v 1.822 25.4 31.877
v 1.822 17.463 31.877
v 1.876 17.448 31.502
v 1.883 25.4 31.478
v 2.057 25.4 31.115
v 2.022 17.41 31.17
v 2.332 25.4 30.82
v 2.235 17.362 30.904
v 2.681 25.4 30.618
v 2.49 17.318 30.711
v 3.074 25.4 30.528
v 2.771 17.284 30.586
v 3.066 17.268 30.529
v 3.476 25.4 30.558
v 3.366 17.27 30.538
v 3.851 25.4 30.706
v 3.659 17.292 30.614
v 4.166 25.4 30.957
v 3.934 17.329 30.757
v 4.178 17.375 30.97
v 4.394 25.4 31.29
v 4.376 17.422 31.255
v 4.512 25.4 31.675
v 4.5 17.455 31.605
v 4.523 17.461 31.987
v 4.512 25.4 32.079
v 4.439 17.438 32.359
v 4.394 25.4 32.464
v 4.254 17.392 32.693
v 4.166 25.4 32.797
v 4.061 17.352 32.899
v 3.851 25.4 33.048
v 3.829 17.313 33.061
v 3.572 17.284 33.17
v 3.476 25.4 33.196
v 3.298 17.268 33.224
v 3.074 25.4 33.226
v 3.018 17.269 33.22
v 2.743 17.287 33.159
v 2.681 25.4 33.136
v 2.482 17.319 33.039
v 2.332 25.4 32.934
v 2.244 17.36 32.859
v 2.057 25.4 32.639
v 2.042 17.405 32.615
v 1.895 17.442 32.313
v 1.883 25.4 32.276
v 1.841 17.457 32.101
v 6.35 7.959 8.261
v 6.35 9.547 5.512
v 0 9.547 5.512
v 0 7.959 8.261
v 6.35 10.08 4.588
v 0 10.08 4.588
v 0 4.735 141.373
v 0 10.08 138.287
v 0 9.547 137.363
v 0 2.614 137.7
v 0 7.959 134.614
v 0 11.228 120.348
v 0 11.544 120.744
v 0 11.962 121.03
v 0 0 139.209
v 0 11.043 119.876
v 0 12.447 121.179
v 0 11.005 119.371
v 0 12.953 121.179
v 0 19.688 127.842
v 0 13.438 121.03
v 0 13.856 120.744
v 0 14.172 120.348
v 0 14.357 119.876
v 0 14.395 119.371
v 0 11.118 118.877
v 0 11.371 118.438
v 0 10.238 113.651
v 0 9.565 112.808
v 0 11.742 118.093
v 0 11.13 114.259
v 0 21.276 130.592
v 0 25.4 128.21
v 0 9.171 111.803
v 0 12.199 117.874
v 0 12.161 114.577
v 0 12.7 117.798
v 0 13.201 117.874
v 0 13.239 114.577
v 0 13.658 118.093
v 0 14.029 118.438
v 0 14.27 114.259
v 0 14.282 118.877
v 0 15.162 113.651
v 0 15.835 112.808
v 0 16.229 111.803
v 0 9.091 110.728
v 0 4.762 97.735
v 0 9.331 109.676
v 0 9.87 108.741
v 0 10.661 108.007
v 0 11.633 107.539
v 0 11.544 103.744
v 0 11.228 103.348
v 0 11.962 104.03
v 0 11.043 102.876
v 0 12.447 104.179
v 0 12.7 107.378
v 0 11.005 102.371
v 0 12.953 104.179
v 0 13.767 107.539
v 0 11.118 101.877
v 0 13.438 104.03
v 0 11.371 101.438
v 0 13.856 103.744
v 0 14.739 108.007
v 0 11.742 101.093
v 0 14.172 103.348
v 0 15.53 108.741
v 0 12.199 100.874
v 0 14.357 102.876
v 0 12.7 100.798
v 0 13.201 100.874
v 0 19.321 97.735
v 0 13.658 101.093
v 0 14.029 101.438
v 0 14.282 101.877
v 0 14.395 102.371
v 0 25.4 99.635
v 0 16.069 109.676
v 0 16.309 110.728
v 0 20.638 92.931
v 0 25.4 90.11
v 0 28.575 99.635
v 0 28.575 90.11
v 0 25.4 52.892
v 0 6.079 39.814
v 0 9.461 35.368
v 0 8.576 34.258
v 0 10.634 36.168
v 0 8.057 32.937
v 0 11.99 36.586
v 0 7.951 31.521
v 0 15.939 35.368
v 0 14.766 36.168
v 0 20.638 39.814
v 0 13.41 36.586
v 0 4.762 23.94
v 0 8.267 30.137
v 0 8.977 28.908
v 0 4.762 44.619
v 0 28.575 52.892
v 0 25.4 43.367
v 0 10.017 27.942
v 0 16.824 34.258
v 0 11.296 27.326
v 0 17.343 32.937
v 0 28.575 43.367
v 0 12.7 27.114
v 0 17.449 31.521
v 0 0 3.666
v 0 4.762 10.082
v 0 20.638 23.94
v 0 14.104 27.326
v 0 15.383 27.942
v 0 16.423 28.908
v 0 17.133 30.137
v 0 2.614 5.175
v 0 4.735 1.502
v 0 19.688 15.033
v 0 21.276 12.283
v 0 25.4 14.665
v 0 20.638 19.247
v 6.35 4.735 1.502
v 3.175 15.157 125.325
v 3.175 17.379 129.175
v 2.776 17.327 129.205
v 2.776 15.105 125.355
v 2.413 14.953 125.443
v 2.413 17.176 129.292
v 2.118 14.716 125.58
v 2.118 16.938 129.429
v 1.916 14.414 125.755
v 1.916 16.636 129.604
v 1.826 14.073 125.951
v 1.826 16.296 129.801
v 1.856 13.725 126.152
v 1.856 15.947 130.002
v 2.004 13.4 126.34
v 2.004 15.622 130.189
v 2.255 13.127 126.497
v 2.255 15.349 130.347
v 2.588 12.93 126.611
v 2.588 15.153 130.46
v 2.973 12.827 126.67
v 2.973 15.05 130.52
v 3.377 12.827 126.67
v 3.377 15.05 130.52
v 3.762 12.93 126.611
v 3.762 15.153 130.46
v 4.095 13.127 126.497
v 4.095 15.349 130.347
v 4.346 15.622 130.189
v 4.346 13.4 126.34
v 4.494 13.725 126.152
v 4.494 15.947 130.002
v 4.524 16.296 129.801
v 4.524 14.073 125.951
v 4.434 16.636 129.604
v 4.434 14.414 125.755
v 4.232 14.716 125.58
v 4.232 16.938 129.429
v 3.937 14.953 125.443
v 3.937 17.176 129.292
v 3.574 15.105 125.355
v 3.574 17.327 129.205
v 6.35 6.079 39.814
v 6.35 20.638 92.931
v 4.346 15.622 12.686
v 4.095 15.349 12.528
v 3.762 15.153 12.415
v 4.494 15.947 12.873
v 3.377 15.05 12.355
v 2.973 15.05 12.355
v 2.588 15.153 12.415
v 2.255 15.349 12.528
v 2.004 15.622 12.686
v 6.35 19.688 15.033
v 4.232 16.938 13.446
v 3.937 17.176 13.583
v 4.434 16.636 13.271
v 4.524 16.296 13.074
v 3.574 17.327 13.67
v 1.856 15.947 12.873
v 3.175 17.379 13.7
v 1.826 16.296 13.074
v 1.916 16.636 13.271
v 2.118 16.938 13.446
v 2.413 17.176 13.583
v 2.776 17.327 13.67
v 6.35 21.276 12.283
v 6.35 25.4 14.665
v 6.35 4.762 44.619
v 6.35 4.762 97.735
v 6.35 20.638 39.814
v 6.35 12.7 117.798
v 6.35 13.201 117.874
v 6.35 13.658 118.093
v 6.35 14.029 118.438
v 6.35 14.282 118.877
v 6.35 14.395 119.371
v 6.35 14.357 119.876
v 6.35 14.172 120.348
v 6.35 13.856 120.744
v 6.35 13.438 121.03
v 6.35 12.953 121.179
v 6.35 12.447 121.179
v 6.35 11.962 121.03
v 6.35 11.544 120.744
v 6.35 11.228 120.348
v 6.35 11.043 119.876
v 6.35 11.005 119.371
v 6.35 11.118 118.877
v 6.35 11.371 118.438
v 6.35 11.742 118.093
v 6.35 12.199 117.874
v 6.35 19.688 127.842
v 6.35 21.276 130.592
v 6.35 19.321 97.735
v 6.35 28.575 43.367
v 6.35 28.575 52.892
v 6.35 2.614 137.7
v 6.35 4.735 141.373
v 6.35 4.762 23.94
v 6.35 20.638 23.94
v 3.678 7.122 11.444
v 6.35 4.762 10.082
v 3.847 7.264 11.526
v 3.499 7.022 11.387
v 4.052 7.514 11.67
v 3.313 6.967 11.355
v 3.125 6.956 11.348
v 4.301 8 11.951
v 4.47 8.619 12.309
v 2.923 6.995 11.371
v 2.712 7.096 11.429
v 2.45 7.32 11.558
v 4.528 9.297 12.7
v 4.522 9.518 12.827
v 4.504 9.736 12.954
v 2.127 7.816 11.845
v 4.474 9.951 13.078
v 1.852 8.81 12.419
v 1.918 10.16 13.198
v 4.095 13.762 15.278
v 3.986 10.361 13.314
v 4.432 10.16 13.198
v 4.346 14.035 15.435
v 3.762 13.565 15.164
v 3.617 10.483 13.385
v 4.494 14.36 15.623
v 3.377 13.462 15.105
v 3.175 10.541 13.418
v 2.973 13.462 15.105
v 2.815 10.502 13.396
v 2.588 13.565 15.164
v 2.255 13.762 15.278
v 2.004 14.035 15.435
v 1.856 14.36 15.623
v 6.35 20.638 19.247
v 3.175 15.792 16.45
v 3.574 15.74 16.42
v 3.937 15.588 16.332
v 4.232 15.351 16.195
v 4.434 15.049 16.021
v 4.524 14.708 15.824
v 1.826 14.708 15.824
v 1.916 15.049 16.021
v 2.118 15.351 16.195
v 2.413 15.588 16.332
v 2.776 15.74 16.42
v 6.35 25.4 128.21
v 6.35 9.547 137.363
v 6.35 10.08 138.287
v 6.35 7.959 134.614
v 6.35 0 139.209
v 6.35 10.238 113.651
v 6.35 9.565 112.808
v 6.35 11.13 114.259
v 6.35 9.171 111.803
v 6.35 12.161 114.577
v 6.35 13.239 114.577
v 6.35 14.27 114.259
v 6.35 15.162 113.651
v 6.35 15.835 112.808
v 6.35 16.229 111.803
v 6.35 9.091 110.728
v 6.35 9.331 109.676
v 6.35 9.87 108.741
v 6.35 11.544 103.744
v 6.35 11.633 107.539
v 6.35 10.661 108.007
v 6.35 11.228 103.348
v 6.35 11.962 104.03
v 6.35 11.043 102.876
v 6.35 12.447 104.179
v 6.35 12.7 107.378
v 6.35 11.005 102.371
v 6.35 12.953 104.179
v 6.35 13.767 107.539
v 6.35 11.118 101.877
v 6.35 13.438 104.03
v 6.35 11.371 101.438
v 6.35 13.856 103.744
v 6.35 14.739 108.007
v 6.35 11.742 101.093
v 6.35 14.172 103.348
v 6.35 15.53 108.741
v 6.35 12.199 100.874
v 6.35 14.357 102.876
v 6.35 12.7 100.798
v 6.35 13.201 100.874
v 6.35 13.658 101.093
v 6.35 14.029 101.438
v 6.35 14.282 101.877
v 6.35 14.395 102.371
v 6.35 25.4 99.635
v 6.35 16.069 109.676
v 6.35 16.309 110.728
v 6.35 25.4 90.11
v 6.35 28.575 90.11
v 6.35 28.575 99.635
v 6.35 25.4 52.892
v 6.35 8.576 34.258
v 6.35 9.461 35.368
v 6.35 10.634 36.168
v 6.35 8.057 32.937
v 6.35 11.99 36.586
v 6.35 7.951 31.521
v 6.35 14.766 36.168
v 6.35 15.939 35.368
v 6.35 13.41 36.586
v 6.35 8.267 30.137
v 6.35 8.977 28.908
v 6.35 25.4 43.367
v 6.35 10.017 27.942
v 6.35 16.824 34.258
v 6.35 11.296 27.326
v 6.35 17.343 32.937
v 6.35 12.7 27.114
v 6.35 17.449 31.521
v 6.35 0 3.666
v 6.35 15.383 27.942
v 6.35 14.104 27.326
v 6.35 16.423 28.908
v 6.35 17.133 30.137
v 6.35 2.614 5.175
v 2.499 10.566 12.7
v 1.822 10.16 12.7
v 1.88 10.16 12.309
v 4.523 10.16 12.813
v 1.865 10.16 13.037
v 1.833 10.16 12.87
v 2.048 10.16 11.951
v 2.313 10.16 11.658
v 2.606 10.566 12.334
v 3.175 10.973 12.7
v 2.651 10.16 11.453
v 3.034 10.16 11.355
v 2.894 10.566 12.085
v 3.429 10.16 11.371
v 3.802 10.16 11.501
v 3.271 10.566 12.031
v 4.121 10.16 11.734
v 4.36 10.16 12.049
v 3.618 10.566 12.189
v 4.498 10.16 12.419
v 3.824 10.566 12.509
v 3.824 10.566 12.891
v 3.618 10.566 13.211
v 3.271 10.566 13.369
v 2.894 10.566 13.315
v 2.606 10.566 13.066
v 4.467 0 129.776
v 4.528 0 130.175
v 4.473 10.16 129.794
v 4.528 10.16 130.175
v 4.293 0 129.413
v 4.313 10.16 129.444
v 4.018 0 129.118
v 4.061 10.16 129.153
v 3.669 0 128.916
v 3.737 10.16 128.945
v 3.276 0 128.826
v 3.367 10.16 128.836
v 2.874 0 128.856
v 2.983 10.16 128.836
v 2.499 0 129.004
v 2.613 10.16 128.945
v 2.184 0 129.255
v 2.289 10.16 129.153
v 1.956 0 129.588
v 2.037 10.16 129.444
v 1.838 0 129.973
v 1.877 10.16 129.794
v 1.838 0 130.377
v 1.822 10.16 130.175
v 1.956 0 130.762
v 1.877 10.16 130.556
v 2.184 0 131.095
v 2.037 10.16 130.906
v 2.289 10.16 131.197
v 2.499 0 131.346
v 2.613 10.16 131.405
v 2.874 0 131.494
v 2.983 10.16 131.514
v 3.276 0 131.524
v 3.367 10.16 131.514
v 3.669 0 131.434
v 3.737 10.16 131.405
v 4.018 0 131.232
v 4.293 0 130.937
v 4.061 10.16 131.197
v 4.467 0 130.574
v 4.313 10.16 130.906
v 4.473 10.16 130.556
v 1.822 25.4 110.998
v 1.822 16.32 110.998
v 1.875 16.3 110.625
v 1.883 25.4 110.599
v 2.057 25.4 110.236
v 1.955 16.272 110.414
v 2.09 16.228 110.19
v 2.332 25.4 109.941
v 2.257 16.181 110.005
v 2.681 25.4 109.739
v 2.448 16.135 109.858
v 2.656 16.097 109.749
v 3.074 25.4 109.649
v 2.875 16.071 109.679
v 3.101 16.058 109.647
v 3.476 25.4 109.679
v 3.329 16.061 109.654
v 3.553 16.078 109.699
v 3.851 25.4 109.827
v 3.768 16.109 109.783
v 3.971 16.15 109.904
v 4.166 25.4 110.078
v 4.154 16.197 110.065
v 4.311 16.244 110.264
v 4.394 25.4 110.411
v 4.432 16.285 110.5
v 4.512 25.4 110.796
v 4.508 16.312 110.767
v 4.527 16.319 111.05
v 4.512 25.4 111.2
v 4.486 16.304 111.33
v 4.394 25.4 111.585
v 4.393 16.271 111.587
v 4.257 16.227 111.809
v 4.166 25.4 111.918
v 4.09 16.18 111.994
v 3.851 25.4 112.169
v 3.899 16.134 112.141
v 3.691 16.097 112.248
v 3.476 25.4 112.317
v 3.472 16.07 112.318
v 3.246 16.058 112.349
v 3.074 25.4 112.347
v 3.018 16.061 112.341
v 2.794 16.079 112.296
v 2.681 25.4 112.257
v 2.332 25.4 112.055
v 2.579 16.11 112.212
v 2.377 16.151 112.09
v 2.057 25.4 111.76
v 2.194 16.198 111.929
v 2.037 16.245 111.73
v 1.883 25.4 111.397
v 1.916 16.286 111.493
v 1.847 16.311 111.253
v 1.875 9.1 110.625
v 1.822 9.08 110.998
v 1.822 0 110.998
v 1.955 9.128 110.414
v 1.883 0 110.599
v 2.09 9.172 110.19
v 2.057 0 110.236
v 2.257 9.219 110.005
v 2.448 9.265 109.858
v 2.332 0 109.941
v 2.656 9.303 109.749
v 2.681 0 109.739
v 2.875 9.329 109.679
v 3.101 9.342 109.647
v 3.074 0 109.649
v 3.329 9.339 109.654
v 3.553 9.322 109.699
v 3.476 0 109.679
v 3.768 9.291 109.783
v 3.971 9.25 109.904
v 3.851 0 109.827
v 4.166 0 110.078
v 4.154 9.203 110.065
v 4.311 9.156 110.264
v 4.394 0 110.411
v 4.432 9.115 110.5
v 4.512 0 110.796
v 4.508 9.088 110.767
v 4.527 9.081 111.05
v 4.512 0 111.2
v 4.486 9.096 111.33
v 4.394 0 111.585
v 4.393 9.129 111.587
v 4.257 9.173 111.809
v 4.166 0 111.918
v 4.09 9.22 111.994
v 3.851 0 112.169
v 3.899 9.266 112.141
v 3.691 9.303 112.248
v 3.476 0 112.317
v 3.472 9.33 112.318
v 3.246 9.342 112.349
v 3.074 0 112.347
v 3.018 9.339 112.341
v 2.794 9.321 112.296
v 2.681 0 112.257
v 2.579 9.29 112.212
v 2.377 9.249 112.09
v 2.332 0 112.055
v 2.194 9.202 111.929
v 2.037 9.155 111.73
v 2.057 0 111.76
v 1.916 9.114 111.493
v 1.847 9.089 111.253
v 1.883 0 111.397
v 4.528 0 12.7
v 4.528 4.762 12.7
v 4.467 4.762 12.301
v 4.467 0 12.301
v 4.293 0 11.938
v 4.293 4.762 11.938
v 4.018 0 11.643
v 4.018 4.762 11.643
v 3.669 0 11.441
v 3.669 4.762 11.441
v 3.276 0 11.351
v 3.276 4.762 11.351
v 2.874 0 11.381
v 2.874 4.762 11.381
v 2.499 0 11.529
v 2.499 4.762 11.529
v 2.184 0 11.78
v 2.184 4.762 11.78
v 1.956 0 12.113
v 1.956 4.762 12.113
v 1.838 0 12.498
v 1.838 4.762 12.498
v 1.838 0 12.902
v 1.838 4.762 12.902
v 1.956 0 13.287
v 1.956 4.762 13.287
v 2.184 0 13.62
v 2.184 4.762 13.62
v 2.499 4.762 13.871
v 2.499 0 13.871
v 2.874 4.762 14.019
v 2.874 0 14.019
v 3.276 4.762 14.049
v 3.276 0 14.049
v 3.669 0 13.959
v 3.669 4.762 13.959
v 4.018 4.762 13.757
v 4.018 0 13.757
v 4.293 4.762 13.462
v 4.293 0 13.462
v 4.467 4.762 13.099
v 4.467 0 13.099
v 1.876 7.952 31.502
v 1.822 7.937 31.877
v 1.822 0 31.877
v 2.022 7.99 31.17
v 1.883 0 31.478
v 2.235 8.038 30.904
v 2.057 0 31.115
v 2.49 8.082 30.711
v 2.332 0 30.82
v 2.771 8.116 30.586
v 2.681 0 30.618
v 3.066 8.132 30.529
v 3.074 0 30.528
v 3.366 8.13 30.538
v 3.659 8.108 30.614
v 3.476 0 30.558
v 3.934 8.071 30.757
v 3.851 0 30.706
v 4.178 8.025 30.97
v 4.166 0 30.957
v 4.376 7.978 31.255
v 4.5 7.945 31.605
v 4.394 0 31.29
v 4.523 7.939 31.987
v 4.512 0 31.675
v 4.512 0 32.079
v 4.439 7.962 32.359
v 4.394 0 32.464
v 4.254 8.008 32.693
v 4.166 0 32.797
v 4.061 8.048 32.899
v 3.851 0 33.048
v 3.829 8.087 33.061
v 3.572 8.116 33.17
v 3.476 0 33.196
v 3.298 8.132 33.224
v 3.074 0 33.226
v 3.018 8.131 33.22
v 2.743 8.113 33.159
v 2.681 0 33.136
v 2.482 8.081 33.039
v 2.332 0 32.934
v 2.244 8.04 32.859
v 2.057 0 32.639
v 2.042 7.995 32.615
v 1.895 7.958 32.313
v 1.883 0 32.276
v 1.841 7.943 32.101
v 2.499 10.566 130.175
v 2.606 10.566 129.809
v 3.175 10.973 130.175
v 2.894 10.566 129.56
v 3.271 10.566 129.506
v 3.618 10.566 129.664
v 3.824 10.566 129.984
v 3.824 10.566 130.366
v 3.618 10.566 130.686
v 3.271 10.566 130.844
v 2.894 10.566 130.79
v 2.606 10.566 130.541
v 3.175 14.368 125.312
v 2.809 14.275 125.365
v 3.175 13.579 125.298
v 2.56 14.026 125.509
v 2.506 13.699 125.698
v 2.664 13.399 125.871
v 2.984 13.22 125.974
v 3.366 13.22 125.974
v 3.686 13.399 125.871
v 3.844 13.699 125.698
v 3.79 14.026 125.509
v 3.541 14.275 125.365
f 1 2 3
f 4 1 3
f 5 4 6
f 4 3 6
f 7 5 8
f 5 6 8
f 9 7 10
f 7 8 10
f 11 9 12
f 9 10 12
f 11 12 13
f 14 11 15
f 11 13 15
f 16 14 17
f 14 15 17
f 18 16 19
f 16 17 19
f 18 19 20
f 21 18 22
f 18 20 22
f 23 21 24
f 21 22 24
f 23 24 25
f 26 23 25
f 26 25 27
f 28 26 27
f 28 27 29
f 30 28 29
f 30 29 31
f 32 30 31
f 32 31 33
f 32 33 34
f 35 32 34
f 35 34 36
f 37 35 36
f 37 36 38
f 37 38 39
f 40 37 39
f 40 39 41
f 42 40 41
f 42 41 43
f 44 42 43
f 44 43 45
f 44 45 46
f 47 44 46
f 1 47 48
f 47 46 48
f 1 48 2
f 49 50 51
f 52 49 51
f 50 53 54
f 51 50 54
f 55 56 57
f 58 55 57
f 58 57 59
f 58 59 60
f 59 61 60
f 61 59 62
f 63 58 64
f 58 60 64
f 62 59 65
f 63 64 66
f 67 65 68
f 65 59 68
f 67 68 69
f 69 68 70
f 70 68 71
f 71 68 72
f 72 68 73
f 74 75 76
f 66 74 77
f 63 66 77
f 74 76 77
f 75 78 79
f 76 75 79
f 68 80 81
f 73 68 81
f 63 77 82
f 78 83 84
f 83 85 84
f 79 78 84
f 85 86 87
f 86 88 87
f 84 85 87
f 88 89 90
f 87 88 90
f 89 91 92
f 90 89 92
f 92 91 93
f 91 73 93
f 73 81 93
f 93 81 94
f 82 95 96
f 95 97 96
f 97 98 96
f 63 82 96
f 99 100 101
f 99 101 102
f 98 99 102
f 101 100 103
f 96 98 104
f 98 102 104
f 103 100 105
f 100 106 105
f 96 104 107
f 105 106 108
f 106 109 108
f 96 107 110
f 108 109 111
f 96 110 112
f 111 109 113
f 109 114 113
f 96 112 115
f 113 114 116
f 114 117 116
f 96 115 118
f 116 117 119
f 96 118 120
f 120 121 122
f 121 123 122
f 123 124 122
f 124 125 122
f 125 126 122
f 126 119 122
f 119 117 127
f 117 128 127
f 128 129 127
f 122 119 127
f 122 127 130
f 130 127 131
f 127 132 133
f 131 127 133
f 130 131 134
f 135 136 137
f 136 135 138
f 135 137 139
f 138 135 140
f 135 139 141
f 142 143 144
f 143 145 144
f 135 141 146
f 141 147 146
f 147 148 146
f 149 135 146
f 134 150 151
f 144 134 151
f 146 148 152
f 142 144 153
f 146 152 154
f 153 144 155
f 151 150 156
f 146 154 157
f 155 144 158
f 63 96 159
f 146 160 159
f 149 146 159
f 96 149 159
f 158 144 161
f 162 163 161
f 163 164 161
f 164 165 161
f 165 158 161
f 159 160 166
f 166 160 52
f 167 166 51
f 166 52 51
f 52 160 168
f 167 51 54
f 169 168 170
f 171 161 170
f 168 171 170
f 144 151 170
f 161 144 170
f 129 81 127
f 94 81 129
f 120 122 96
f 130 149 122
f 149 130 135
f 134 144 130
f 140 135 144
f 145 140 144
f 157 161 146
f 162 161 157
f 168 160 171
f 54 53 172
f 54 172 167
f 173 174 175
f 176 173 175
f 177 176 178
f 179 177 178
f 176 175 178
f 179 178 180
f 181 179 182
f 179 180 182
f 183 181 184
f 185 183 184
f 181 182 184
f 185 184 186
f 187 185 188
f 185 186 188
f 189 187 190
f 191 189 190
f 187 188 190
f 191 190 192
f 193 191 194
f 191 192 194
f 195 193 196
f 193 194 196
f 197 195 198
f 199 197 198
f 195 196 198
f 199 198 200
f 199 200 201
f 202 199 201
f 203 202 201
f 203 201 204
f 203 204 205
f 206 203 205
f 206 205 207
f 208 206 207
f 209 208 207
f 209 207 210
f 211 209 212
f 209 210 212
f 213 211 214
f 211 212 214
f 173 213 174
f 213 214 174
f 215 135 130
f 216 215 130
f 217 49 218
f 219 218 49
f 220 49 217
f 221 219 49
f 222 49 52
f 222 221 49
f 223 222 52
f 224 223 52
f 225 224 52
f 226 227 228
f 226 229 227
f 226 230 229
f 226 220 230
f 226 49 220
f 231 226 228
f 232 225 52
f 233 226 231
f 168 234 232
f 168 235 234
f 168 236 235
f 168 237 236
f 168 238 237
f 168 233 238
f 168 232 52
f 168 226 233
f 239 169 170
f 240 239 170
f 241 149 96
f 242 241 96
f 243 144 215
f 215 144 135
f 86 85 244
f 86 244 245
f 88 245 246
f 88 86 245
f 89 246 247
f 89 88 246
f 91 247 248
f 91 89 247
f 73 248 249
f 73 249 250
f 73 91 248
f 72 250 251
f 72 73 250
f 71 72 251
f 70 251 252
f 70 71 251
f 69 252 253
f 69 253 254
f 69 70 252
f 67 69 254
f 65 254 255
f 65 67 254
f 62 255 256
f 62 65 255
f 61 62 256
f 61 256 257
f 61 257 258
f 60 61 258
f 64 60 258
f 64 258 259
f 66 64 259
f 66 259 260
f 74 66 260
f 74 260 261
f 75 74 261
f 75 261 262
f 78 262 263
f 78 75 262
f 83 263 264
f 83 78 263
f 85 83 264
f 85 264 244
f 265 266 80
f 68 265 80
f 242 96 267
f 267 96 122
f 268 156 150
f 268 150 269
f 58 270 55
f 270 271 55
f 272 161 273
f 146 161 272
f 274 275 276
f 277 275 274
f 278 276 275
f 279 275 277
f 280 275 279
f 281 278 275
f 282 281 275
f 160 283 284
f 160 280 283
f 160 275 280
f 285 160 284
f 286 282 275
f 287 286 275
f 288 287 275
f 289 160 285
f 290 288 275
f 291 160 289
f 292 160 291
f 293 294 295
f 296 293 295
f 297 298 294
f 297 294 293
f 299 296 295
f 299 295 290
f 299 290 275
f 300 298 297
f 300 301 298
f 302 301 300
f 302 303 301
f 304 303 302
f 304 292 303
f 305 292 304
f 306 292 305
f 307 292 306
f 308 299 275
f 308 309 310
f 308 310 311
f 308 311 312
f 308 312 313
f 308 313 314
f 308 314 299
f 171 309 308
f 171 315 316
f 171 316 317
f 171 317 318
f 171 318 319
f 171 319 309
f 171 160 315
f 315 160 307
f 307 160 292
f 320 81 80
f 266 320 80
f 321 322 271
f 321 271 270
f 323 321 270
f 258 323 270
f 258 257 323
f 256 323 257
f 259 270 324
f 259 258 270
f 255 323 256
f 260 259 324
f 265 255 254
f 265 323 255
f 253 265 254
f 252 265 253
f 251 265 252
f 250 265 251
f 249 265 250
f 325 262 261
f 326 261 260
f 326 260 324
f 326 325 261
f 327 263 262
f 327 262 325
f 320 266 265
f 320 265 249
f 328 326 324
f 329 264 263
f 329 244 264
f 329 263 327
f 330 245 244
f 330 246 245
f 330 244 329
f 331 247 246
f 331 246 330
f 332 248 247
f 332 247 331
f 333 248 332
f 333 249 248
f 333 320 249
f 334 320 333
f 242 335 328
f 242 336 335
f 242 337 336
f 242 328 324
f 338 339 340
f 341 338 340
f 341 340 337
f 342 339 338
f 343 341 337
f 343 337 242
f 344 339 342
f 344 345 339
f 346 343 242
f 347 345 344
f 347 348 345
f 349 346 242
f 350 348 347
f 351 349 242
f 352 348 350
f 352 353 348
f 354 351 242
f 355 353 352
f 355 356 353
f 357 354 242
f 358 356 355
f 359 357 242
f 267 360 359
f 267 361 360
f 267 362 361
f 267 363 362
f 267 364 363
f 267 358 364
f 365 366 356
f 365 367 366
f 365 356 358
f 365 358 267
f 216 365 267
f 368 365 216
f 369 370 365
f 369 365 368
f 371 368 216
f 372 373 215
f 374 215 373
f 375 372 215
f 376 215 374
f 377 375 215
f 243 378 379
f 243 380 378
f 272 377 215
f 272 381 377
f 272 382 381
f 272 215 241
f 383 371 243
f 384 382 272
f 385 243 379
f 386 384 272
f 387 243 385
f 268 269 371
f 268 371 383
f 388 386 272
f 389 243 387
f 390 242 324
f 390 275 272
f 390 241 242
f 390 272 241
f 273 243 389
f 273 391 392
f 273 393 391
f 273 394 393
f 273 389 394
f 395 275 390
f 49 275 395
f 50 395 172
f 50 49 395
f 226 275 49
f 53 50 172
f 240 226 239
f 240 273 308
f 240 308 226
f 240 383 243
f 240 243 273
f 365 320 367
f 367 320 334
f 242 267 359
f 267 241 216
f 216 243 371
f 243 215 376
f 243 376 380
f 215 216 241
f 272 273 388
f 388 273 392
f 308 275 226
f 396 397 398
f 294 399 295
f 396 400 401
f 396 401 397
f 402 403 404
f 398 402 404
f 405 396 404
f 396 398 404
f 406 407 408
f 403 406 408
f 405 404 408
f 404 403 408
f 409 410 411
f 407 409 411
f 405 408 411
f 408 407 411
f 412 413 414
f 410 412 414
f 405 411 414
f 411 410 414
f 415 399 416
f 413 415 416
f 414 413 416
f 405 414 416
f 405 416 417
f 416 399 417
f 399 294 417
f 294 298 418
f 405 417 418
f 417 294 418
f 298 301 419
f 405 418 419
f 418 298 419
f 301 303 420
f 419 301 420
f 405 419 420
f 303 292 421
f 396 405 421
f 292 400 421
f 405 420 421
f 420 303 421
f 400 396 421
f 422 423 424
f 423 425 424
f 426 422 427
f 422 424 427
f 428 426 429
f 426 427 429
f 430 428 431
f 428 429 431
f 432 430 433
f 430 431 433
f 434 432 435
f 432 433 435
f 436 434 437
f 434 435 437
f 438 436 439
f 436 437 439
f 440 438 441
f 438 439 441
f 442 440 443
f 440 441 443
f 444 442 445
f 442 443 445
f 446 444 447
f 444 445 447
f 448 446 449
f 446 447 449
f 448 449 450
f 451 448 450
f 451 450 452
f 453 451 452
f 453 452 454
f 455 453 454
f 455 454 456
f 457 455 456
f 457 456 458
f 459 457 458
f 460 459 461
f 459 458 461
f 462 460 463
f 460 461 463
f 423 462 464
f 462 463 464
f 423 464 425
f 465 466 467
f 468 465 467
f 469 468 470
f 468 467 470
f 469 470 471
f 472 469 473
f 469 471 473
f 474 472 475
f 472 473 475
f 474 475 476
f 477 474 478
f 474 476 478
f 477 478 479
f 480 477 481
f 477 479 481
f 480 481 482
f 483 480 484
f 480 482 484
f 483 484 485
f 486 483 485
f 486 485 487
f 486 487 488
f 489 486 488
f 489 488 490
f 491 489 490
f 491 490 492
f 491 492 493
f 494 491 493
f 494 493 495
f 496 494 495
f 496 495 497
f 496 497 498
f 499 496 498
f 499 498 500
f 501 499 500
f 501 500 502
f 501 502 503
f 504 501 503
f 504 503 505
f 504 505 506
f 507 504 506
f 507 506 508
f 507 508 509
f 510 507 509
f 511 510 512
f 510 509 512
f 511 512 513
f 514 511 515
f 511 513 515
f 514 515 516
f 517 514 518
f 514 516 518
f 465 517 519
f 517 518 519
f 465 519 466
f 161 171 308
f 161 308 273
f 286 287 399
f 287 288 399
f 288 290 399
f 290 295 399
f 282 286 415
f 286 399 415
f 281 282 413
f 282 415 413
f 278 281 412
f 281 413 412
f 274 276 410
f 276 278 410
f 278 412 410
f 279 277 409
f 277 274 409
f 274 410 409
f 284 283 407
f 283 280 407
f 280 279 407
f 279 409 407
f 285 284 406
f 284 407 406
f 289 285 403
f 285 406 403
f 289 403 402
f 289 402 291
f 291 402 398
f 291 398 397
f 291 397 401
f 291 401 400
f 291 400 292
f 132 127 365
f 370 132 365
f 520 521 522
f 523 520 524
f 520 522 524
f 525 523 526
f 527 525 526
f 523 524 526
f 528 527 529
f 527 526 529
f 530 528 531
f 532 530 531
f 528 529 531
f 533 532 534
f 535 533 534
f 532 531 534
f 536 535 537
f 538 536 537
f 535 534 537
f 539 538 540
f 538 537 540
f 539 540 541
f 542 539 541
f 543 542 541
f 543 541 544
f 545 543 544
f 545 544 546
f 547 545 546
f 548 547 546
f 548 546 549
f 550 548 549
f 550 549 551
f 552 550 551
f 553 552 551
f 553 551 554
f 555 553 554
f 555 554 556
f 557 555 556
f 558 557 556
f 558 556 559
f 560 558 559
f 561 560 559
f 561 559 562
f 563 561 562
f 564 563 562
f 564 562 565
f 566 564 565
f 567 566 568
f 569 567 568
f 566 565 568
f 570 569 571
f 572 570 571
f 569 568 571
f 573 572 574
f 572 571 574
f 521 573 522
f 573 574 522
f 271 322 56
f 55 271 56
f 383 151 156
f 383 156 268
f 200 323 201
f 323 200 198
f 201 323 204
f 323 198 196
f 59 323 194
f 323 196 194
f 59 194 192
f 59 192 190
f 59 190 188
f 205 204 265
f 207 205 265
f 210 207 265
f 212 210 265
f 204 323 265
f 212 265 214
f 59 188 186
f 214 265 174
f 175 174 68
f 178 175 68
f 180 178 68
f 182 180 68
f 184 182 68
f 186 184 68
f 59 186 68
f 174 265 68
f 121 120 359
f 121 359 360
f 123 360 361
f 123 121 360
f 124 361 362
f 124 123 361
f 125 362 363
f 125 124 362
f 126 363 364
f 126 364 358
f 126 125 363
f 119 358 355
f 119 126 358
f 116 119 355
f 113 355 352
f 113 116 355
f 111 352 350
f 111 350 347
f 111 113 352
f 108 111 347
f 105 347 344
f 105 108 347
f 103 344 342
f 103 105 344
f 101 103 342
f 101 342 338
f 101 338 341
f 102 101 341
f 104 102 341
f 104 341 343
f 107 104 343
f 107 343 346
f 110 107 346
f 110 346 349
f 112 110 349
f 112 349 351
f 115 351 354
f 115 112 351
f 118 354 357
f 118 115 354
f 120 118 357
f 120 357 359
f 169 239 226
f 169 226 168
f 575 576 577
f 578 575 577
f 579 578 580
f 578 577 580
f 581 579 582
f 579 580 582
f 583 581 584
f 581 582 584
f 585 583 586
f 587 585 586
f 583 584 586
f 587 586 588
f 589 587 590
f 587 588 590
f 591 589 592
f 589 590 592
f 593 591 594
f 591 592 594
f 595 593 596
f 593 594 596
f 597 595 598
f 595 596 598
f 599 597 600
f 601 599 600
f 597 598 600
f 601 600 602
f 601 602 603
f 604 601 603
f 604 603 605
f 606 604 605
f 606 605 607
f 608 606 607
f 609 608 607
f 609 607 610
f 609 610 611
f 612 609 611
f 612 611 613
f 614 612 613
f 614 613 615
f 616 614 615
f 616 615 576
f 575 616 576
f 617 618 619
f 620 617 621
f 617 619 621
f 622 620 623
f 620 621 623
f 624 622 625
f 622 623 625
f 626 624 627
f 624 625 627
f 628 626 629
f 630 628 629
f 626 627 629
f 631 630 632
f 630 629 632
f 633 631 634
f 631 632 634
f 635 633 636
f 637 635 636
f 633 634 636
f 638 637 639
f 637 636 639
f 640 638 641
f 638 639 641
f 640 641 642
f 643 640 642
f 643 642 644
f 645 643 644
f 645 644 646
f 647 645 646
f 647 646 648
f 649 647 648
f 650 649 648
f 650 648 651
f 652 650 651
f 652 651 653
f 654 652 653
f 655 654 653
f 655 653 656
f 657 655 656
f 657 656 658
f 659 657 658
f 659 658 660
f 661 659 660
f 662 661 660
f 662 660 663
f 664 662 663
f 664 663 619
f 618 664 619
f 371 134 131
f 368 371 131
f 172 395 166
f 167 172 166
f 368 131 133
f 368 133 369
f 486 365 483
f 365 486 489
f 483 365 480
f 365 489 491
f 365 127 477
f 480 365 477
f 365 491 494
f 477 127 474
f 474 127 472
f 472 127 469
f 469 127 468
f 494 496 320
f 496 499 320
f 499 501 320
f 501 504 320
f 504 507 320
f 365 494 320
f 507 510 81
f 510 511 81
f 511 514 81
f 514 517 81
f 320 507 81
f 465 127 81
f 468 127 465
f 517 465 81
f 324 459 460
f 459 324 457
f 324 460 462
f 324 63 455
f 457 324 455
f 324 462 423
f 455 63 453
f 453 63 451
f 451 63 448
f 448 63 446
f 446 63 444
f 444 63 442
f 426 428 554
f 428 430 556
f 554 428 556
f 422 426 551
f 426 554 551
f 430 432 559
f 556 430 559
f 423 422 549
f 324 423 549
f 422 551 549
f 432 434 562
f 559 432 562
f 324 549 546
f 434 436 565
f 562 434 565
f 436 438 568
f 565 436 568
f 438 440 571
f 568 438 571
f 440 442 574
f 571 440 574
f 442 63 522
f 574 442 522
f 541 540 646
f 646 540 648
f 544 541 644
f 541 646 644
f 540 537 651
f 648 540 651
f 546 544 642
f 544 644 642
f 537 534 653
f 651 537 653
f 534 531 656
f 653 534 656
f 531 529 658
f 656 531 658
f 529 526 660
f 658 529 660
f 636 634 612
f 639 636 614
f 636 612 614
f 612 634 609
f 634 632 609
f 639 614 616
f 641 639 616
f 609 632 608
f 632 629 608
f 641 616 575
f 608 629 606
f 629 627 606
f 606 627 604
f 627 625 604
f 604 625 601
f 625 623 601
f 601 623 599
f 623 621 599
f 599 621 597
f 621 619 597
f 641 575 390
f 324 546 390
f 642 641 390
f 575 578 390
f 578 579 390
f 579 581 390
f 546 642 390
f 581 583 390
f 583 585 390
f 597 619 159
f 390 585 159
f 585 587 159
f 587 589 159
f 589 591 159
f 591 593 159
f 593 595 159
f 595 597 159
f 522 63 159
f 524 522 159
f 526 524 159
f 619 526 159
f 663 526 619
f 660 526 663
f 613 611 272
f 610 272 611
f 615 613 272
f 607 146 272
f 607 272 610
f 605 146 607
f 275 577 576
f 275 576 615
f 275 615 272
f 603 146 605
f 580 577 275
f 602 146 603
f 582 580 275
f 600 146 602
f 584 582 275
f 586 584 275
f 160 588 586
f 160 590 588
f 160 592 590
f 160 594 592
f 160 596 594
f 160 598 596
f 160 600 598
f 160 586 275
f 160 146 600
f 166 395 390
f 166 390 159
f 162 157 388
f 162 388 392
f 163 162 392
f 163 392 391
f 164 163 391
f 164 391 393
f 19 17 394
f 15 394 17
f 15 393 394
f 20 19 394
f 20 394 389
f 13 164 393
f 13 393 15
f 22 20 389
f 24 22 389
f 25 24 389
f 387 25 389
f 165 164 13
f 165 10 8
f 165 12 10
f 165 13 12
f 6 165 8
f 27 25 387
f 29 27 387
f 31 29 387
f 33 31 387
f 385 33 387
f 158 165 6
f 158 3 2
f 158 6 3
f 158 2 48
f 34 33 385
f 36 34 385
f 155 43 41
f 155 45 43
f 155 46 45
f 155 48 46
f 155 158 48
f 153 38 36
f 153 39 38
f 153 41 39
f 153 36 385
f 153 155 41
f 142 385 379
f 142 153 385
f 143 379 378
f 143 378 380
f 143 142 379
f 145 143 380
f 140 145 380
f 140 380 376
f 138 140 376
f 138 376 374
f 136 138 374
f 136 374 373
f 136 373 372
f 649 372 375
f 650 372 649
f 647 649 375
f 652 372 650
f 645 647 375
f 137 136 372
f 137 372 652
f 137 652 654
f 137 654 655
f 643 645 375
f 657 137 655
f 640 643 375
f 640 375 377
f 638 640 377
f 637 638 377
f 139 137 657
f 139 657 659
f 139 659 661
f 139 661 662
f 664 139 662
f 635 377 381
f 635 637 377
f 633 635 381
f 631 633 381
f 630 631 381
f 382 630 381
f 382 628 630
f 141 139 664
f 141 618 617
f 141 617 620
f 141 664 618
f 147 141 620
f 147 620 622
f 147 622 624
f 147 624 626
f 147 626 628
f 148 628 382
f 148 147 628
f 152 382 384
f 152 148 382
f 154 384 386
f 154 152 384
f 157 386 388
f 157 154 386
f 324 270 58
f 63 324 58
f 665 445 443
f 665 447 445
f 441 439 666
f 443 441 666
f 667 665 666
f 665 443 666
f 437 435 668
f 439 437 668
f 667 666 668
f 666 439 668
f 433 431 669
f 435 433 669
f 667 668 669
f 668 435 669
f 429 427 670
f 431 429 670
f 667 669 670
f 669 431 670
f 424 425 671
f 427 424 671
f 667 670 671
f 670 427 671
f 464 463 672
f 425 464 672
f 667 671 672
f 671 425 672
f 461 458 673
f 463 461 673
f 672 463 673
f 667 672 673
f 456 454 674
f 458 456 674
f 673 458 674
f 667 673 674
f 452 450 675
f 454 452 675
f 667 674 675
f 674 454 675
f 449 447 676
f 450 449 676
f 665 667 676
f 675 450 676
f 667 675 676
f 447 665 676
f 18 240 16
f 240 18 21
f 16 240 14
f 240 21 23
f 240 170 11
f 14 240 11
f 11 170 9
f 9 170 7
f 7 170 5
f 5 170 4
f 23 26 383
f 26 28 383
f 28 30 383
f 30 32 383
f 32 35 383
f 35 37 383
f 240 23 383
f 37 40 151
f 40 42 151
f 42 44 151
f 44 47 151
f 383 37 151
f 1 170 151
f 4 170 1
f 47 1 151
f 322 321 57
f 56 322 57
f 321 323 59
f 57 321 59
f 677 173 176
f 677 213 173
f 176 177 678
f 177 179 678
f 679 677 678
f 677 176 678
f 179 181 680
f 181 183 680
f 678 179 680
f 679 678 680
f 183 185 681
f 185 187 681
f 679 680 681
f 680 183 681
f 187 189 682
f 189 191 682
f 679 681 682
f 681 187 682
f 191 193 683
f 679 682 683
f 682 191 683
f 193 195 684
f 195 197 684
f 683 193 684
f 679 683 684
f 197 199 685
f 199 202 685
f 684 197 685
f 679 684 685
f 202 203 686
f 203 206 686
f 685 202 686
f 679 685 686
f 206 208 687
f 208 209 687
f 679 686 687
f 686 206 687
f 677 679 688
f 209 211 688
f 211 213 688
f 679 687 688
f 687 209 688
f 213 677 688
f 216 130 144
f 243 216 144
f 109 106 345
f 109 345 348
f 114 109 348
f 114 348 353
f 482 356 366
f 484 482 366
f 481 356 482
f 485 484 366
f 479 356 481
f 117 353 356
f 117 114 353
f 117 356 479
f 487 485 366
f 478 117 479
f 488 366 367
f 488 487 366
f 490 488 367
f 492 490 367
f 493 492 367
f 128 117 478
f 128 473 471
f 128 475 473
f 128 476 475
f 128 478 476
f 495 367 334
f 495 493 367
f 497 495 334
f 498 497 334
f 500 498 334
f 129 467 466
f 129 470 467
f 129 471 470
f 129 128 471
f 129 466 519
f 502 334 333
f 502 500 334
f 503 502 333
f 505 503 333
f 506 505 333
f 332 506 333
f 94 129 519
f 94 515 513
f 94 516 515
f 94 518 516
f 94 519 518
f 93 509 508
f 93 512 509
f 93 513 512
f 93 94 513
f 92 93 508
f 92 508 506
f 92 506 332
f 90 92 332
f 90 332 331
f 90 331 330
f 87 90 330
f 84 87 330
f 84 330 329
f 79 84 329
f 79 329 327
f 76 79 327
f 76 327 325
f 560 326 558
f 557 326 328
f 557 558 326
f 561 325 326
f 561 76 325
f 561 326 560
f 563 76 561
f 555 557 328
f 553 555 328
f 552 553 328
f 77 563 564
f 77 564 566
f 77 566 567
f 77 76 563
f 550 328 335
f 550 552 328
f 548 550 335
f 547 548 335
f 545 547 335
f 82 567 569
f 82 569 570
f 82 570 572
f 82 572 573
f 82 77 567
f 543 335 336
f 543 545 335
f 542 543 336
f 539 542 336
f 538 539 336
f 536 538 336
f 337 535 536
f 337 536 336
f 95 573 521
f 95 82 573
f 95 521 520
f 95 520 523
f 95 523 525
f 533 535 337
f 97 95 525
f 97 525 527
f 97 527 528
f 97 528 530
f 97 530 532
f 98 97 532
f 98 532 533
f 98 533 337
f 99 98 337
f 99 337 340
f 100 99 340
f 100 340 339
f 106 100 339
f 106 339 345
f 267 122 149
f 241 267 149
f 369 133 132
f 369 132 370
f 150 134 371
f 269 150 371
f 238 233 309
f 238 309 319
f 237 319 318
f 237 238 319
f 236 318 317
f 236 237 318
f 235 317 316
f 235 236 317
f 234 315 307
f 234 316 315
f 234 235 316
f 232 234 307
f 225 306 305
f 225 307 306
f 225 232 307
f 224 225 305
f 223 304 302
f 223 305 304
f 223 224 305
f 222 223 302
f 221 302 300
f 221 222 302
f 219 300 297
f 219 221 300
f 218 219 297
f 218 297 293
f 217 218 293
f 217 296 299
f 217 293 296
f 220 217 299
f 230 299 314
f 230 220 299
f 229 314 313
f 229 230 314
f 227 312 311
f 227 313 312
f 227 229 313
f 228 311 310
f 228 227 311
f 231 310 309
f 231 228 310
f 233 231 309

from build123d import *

# Parameters (mm, degrees)
SKETCH1_R                     = 3.6195
SKETCH1_R_2                   = 4.7625
SKETCH1_R_3                   = 1.6999966
BOSS_EXTRUDE1_DEPTH           = 6.35
SKETCH12_W                    = 6.35
SKETCH12_H                    = 6.1722
BOSS_EXTRUDE3_DEPTH           = 1.0668
CUT_EXTRUDE1_DEPTH            = 146.254081268
TAP_DRILL_FOR_6_32_TAP4_D     = 2.7051
TAP_DRILL_FOR_6_32_TAP3_D     = 2.7051
TAP_DRILL_FOR_6_32_TAP3_DEPTH = 10.16
TAP_DRILL_FOR_6_32_TAP3_TIP   = 0.81269403
SKETCH20_W                    = 6.35
SKETCH20_H                    = 13.543293675
SKETCH20_H_2                  = 12.7
CUT_EXTRUDE2_DEPTH            = 3.175
SKETCH21_W                    = 6.35
SKETCH21_H                    = 9.525
BOSS_EXTRUDE4_DEPTH           = 3.175


with BuildPart() as part:
    # Sketch1 → Boss-Extrude1 (new body)
    with BuildSketch(Plane(origin=(0, 0, 0), x_dir=(0, 0, -1), z_dir=(1, 0, 0))):
        Polygon((0, 0), (-14.664696837, 25.4), (-128.210303163, 25.4), (-142.875, 0), align=None)
        with Locations((-110.998, 12.7)):
            Circle(SKETCH1_R, mode=Mode.SUBTRACT)
        with Locations((-31.877, 12.7)):
            Circle(SKETCH1_R_2, mode=Mode.SUBTRACT)
        with Locations((-102.4979916, 12.7)):
            Circle(SKETCH1_R_3, mode=Mode.SUBTRACT)
        with Locations((-119.4980084, 12.7)):
            Circle(SKETCH1_R_3, mode=Mode.SUBTRACT)
    extrude(amount=BOSS_EXTRUDE1_DEPTH)

    # Sketch12 → Boss-Extrude3 (add)
    with BuildSketch(Plane(origin=(0, 0, 0), x_dir=(-1, 0, 0), z_dir=(0, 0.49999999999999806, -0.8660254037844398))):
        with Locations((-3.175, 7.9375)):
            Rectangle(SKETCH12_W, SKETCH12_H)
    boss_extrude3 = extrude(amount=BOSS_EXTRUDE3_DEPTH)

    # Sketch19 → Cut-Extrude1 (cut, through all)
    with BuildSketch(Plane.ZY):
        Polygon((92.930922513, 20.6375), (39.8145, 20.6375), (39.8145, 6.079337508), align=None)
        Polygon((97.7354916, 4.7625), (97.7354916, 19.320662492), (44.619069087, 4.7625), align=None)
        Polygon((23.9395, 20.6375), (23.9395, 4.7625), (10.081979076, 4.7625), (19.247414599, 20.6375), align=None)
    extrude(amount=-CUT_EXTRUDE1_DEPTH, mode=Mode.SUBTRACT)

    # Tap Drill for #6-32 Tap4 (through all)
    with Locations(Plane(origin=(0, 25.4, 0), x_dir=(1, 0, 0), z_dir=(0, 1, 0))):
        with Locations((3.175, -110.998), (3.175, -31.877)):
            Hole(TAP_DRILL_FOR_6_32_TAP4_D / 2)

    # Tap Drill for #6-32 Tap3
    with Locations(Plane(origin=(0, 0, 0), x_dir=(-1, 0, 0), z_dir=(0, -1, 0))):
        with Locations((-3.175, -130.175), (-3.175, -12.7)):
            Hole(TAP_DRILL_FOR_6_32_TAP3_D / 2, depth=TAP_DRILL_FOR_6_32_TAP3_DEPTH)
            with Locations((0, 0, -(TAP_DRILL_FOR_6_32_TAP3_DEPTH + TAP_DRILL_FOR_6_32_TAP3_TIP / 2))):  # 118° drill point
                Cone(0, TAP_DRILL_FOR_6_32_TAP3_D / 2, TAP_DRILL_FOR_6_32_TAP3_TIP, mode=Mode.SUBTRACT)

    # Sketch15 → Tap Drill for #6-32 Tap2 (revolve, cut)
    with BuildSketch(Plane(origin=(3.175, 17.795609612, 10.2743), x_dir=(0, 0.8660254037844398, 0.49999999999999806), z_dir=(1, 0, 0))):
        Polygon((0, 0), (0, 8.43269403), (1.35255, 7.62), (1.35255, 0), align=None)
    tap_drill_for_6_32_tap2 = revolve(axis=Axis((3.175, 20.970609612, 4.775038686), (0, -0.499999999999998, 0.8660254037844398)), mode=Mode.SUBTRACT)

    # Sketch20 → Cut-Extrude2 (cut)
    with BuildSketch(Plane(origin=(0, 0, 0), x_dir=(-1, 0, 0), z_dir=(0, 0.49999999999999806, -0.8660254037844398))):
        with Locations((-3.175, 17.795246838)):
            Rectangle(SKETCH20_W, SKETCH20_H)
        with Locations((-3.175, -1.4986)):
            Rectangle(SKETCH20_W, SKETCH20_H_2)
    cut_extrude2 = extrude(amount=-CUT_EXTRUDE2_DEPTH, mode=Mode.SUBTRACT)

    # Mirror1: Boss-Extrude3, Tap Drill for #6-32 Tap2, Cut-Extrude2 across plane
    add(boss_extrude3.mirror(Plane(origin=(0, 0, 71.4375), x_dir=(1, 0, 0), z_dir=(0, 0, -1))))
    add(tap_drill_for_6_32_tap2.mirror(Plane(origin=(0, 0, 71.4375), x_dir=(1, 0, 0), z_dir=(0, 0, -1))), mode=Mode.SUBTRACT)
    add(cut_extrude2.mirror(Plane(origin=(0, 0, 71.4375), x_dir=(1, 0, 0), z_dir=(0, 0, -1))), mode=Mode.SUBTRACT)

    # Sketch21 → Boss-Extrude4 (add)
    with BuildSketch(Plane(origin=(0, 25.4, 0), x_dir=(1, 0, 0), z_dir=(0, 1, 0))):
        with Locations((3.175, -48.129196837)):
            Rectangle(SKETCH21_W, SKETCH21_H)
        with Locations((3.175, -94.872803163)):
            Rectangle(SKETCH21_W, SKETCH21_H)
    extrude(amount=BOSS_EXTRUDE4_DEPTH)


solid = part.part
